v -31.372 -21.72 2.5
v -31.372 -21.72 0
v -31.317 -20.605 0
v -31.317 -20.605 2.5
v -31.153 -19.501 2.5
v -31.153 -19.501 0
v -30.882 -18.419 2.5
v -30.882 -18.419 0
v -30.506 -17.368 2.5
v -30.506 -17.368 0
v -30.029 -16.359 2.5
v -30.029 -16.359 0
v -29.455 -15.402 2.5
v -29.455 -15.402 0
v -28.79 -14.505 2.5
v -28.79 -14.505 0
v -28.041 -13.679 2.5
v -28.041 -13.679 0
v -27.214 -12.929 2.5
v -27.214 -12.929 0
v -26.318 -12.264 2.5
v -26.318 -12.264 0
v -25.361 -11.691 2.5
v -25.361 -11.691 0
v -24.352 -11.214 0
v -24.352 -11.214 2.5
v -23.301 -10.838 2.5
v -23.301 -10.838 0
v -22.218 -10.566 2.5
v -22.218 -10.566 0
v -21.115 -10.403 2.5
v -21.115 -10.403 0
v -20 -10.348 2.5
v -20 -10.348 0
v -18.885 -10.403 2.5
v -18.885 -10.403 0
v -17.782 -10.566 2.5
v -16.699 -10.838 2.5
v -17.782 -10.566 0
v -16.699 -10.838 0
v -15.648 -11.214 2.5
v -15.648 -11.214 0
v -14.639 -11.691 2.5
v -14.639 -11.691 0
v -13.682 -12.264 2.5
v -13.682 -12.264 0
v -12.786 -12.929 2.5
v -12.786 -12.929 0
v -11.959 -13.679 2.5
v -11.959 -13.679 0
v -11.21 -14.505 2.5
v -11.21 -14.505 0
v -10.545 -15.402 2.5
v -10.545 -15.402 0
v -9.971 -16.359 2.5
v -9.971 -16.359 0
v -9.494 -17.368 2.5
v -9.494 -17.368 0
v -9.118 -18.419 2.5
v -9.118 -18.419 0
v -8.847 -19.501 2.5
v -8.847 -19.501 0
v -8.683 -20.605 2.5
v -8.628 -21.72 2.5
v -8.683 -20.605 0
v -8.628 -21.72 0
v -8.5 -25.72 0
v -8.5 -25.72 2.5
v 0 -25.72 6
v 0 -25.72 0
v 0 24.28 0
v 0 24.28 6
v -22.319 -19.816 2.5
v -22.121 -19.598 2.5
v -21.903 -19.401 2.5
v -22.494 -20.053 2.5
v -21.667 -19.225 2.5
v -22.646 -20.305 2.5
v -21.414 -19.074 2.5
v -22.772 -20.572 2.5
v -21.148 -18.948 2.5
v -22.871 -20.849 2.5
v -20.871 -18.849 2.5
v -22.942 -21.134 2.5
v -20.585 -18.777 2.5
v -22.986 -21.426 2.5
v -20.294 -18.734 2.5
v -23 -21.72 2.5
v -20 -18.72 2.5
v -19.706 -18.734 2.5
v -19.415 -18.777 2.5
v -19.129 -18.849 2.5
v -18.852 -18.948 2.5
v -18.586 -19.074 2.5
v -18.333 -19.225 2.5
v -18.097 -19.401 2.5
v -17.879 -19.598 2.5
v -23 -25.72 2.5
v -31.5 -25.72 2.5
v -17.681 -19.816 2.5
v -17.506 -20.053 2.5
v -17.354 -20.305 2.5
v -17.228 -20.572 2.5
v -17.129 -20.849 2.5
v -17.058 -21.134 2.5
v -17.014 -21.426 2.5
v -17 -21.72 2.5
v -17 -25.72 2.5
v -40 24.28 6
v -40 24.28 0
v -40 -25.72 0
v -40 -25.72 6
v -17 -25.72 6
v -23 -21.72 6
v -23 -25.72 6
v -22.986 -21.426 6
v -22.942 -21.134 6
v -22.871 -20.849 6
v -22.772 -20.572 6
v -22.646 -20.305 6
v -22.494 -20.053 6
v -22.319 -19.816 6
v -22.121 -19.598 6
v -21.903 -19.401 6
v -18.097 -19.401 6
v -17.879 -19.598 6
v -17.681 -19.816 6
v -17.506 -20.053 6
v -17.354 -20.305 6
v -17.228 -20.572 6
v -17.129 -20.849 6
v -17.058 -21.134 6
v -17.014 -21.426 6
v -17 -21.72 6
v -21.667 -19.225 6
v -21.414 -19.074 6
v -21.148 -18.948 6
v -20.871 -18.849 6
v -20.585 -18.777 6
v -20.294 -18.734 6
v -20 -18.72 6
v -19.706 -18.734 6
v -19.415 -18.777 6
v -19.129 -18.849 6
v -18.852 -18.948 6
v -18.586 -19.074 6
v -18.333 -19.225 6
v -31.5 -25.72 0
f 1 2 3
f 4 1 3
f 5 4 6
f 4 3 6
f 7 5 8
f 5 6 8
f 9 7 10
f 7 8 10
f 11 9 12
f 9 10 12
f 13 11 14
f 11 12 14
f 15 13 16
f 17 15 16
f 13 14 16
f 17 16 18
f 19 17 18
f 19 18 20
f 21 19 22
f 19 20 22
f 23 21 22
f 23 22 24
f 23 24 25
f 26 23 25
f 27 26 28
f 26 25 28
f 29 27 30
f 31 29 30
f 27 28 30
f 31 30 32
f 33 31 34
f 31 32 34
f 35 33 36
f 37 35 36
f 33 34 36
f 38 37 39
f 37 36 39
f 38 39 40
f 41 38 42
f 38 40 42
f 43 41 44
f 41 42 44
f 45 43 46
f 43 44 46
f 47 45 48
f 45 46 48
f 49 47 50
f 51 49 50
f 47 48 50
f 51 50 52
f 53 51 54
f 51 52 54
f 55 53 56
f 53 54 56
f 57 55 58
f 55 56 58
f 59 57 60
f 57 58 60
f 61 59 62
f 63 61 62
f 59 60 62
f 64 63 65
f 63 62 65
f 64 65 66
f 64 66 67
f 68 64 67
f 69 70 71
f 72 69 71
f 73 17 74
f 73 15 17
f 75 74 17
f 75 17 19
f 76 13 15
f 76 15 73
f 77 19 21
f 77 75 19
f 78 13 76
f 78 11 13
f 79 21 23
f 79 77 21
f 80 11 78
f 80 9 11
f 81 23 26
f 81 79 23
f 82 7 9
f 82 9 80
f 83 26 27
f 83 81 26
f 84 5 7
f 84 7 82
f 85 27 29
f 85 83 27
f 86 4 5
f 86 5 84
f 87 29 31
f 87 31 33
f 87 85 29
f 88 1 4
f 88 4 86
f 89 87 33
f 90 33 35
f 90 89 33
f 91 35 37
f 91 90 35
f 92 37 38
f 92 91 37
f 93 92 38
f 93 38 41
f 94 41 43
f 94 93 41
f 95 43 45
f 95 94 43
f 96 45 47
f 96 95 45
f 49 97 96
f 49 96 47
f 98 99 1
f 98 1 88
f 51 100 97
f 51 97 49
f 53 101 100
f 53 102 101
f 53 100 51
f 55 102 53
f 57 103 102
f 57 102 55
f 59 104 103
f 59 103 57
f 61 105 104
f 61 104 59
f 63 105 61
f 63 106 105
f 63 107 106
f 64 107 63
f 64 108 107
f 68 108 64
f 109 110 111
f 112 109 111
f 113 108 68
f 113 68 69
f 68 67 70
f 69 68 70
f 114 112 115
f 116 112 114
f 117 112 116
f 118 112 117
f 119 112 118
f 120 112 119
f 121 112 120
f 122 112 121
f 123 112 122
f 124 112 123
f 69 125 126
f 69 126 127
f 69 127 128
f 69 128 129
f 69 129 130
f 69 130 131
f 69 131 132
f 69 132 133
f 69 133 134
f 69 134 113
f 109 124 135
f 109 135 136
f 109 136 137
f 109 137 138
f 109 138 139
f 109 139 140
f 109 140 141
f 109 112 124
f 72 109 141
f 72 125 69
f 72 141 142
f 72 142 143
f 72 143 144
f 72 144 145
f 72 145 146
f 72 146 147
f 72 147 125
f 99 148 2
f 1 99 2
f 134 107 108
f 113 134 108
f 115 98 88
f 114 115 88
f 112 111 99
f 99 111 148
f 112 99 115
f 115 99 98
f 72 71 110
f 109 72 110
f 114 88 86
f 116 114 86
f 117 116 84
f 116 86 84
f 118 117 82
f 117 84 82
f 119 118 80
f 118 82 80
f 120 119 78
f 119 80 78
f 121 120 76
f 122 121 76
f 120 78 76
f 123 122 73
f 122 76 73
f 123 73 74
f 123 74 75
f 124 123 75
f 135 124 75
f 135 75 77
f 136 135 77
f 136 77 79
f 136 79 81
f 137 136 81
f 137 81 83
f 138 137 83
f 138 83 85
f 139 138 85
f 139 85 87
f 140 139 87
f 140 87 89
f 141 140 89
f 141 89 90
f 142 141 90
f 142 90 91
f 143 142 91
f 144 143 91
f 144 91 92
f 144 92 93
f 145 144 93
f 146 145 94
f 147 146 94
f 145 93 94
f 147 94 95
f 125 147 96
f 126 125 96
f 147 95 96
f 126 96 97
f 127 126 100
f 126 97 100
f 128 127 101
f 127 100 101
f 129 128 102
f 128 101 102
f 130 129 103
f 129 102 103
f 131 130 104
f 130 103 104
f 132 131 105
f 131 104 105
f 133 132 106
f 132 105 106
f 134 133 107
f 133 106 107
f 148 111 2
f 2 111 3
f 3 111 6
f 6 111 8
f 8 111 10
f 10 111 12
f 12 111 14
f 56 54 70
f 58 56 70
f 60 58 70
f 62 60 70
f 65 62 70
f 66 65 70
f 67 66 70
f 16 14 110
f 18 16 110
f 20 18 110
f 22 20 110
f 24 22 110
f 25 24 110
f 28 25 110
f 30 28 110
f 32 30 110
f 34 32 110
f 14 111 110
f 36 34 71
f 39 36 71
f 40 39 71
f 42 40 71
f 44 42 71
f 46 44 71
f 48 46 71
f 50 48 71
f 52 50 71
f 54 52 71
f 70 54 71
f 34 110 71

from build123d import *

# Parameters (mm, degrees)
F1_DEPTH = 6
F3_DEPTH = 2.5


with BuildPart() as f1:
    # F0 (on Top) → F1 (new body)
    with BuildSketch(Plane.XY):
        with BuildLine():
            Line((0, -25.719567), (0, 24.280433))
            Line((0, 24.280433), (-40, 24.280433))
            Line((-40, 24.280433), (-40, -25.719567))
            Line((-40, -25.719567), (-23, -25.719567))
            Line((-23, -25.719567), (-23, -21.719567))
            ThreePointArc((-23, -21.719567), (-20, -18.719567), (-17, -21.719567))
            Line((-17, -21.719567), (-17, -25.719567))
            Line((-17, -25.719567), (0, -25.719567))
        make_face()
    extrude(amount=F1_DEPTH)

    # F2 (on face) → F3 (cut)
    with BuildSketch(Plane(origin=(0, 0, 0), x_dir=(1, 0, 0), z_dir=(0, 0, -1))):
        with BuildLine():
            Line((-9.355118, 25.719567), (-30.644882, 25.719567))
            ThreePointArc((-30.644882, 25.719567), (-31.188453, 23.752307), (-31.37161, 21.719567))
            ThreePointArc((-31.37161, 21.719567), (-20, 10.347957), (-8.62839, 21.719567))
            ThreePointArc((-8.62839, 21.719567), (-8.811547, 23.752307), (-9.355118, 25.719567))
        make_face()
        with BuildLine():
            ThreePointArc((-9.355118, 25.719567), (-20, 33.091177), (-30.644882, 25.719567))
            Line((-30.644882, 25.719567), (-9.355118, 25.719567))
        make_face()
        with BuildLine():
            ThreePointArc((-31.37161, 21.719567), (-31.188453, 23.752307), (-30.644882, 25.719567))
            Line((-30.644882, 25.719567), (-31.5, 25.719567))
            Line((-31.5, 25.719567), (-31.37161, 21.719567))
        make_face()
        with BuildLine():
            Line((-8.5, 25.719567), (-9.355118, 25.719567))
            ThreePointArc((-9.355118, 25.719567), (-8.811547, 23.752307), (-8.62839, 21.719567))
            Line((-8.62839, 21.719567), (-8.5, 25.719567))
        make_face()
    extrude(amount=-F3_DEPTH, mode=Mode.SUBTRACT)


solid = f1.part
